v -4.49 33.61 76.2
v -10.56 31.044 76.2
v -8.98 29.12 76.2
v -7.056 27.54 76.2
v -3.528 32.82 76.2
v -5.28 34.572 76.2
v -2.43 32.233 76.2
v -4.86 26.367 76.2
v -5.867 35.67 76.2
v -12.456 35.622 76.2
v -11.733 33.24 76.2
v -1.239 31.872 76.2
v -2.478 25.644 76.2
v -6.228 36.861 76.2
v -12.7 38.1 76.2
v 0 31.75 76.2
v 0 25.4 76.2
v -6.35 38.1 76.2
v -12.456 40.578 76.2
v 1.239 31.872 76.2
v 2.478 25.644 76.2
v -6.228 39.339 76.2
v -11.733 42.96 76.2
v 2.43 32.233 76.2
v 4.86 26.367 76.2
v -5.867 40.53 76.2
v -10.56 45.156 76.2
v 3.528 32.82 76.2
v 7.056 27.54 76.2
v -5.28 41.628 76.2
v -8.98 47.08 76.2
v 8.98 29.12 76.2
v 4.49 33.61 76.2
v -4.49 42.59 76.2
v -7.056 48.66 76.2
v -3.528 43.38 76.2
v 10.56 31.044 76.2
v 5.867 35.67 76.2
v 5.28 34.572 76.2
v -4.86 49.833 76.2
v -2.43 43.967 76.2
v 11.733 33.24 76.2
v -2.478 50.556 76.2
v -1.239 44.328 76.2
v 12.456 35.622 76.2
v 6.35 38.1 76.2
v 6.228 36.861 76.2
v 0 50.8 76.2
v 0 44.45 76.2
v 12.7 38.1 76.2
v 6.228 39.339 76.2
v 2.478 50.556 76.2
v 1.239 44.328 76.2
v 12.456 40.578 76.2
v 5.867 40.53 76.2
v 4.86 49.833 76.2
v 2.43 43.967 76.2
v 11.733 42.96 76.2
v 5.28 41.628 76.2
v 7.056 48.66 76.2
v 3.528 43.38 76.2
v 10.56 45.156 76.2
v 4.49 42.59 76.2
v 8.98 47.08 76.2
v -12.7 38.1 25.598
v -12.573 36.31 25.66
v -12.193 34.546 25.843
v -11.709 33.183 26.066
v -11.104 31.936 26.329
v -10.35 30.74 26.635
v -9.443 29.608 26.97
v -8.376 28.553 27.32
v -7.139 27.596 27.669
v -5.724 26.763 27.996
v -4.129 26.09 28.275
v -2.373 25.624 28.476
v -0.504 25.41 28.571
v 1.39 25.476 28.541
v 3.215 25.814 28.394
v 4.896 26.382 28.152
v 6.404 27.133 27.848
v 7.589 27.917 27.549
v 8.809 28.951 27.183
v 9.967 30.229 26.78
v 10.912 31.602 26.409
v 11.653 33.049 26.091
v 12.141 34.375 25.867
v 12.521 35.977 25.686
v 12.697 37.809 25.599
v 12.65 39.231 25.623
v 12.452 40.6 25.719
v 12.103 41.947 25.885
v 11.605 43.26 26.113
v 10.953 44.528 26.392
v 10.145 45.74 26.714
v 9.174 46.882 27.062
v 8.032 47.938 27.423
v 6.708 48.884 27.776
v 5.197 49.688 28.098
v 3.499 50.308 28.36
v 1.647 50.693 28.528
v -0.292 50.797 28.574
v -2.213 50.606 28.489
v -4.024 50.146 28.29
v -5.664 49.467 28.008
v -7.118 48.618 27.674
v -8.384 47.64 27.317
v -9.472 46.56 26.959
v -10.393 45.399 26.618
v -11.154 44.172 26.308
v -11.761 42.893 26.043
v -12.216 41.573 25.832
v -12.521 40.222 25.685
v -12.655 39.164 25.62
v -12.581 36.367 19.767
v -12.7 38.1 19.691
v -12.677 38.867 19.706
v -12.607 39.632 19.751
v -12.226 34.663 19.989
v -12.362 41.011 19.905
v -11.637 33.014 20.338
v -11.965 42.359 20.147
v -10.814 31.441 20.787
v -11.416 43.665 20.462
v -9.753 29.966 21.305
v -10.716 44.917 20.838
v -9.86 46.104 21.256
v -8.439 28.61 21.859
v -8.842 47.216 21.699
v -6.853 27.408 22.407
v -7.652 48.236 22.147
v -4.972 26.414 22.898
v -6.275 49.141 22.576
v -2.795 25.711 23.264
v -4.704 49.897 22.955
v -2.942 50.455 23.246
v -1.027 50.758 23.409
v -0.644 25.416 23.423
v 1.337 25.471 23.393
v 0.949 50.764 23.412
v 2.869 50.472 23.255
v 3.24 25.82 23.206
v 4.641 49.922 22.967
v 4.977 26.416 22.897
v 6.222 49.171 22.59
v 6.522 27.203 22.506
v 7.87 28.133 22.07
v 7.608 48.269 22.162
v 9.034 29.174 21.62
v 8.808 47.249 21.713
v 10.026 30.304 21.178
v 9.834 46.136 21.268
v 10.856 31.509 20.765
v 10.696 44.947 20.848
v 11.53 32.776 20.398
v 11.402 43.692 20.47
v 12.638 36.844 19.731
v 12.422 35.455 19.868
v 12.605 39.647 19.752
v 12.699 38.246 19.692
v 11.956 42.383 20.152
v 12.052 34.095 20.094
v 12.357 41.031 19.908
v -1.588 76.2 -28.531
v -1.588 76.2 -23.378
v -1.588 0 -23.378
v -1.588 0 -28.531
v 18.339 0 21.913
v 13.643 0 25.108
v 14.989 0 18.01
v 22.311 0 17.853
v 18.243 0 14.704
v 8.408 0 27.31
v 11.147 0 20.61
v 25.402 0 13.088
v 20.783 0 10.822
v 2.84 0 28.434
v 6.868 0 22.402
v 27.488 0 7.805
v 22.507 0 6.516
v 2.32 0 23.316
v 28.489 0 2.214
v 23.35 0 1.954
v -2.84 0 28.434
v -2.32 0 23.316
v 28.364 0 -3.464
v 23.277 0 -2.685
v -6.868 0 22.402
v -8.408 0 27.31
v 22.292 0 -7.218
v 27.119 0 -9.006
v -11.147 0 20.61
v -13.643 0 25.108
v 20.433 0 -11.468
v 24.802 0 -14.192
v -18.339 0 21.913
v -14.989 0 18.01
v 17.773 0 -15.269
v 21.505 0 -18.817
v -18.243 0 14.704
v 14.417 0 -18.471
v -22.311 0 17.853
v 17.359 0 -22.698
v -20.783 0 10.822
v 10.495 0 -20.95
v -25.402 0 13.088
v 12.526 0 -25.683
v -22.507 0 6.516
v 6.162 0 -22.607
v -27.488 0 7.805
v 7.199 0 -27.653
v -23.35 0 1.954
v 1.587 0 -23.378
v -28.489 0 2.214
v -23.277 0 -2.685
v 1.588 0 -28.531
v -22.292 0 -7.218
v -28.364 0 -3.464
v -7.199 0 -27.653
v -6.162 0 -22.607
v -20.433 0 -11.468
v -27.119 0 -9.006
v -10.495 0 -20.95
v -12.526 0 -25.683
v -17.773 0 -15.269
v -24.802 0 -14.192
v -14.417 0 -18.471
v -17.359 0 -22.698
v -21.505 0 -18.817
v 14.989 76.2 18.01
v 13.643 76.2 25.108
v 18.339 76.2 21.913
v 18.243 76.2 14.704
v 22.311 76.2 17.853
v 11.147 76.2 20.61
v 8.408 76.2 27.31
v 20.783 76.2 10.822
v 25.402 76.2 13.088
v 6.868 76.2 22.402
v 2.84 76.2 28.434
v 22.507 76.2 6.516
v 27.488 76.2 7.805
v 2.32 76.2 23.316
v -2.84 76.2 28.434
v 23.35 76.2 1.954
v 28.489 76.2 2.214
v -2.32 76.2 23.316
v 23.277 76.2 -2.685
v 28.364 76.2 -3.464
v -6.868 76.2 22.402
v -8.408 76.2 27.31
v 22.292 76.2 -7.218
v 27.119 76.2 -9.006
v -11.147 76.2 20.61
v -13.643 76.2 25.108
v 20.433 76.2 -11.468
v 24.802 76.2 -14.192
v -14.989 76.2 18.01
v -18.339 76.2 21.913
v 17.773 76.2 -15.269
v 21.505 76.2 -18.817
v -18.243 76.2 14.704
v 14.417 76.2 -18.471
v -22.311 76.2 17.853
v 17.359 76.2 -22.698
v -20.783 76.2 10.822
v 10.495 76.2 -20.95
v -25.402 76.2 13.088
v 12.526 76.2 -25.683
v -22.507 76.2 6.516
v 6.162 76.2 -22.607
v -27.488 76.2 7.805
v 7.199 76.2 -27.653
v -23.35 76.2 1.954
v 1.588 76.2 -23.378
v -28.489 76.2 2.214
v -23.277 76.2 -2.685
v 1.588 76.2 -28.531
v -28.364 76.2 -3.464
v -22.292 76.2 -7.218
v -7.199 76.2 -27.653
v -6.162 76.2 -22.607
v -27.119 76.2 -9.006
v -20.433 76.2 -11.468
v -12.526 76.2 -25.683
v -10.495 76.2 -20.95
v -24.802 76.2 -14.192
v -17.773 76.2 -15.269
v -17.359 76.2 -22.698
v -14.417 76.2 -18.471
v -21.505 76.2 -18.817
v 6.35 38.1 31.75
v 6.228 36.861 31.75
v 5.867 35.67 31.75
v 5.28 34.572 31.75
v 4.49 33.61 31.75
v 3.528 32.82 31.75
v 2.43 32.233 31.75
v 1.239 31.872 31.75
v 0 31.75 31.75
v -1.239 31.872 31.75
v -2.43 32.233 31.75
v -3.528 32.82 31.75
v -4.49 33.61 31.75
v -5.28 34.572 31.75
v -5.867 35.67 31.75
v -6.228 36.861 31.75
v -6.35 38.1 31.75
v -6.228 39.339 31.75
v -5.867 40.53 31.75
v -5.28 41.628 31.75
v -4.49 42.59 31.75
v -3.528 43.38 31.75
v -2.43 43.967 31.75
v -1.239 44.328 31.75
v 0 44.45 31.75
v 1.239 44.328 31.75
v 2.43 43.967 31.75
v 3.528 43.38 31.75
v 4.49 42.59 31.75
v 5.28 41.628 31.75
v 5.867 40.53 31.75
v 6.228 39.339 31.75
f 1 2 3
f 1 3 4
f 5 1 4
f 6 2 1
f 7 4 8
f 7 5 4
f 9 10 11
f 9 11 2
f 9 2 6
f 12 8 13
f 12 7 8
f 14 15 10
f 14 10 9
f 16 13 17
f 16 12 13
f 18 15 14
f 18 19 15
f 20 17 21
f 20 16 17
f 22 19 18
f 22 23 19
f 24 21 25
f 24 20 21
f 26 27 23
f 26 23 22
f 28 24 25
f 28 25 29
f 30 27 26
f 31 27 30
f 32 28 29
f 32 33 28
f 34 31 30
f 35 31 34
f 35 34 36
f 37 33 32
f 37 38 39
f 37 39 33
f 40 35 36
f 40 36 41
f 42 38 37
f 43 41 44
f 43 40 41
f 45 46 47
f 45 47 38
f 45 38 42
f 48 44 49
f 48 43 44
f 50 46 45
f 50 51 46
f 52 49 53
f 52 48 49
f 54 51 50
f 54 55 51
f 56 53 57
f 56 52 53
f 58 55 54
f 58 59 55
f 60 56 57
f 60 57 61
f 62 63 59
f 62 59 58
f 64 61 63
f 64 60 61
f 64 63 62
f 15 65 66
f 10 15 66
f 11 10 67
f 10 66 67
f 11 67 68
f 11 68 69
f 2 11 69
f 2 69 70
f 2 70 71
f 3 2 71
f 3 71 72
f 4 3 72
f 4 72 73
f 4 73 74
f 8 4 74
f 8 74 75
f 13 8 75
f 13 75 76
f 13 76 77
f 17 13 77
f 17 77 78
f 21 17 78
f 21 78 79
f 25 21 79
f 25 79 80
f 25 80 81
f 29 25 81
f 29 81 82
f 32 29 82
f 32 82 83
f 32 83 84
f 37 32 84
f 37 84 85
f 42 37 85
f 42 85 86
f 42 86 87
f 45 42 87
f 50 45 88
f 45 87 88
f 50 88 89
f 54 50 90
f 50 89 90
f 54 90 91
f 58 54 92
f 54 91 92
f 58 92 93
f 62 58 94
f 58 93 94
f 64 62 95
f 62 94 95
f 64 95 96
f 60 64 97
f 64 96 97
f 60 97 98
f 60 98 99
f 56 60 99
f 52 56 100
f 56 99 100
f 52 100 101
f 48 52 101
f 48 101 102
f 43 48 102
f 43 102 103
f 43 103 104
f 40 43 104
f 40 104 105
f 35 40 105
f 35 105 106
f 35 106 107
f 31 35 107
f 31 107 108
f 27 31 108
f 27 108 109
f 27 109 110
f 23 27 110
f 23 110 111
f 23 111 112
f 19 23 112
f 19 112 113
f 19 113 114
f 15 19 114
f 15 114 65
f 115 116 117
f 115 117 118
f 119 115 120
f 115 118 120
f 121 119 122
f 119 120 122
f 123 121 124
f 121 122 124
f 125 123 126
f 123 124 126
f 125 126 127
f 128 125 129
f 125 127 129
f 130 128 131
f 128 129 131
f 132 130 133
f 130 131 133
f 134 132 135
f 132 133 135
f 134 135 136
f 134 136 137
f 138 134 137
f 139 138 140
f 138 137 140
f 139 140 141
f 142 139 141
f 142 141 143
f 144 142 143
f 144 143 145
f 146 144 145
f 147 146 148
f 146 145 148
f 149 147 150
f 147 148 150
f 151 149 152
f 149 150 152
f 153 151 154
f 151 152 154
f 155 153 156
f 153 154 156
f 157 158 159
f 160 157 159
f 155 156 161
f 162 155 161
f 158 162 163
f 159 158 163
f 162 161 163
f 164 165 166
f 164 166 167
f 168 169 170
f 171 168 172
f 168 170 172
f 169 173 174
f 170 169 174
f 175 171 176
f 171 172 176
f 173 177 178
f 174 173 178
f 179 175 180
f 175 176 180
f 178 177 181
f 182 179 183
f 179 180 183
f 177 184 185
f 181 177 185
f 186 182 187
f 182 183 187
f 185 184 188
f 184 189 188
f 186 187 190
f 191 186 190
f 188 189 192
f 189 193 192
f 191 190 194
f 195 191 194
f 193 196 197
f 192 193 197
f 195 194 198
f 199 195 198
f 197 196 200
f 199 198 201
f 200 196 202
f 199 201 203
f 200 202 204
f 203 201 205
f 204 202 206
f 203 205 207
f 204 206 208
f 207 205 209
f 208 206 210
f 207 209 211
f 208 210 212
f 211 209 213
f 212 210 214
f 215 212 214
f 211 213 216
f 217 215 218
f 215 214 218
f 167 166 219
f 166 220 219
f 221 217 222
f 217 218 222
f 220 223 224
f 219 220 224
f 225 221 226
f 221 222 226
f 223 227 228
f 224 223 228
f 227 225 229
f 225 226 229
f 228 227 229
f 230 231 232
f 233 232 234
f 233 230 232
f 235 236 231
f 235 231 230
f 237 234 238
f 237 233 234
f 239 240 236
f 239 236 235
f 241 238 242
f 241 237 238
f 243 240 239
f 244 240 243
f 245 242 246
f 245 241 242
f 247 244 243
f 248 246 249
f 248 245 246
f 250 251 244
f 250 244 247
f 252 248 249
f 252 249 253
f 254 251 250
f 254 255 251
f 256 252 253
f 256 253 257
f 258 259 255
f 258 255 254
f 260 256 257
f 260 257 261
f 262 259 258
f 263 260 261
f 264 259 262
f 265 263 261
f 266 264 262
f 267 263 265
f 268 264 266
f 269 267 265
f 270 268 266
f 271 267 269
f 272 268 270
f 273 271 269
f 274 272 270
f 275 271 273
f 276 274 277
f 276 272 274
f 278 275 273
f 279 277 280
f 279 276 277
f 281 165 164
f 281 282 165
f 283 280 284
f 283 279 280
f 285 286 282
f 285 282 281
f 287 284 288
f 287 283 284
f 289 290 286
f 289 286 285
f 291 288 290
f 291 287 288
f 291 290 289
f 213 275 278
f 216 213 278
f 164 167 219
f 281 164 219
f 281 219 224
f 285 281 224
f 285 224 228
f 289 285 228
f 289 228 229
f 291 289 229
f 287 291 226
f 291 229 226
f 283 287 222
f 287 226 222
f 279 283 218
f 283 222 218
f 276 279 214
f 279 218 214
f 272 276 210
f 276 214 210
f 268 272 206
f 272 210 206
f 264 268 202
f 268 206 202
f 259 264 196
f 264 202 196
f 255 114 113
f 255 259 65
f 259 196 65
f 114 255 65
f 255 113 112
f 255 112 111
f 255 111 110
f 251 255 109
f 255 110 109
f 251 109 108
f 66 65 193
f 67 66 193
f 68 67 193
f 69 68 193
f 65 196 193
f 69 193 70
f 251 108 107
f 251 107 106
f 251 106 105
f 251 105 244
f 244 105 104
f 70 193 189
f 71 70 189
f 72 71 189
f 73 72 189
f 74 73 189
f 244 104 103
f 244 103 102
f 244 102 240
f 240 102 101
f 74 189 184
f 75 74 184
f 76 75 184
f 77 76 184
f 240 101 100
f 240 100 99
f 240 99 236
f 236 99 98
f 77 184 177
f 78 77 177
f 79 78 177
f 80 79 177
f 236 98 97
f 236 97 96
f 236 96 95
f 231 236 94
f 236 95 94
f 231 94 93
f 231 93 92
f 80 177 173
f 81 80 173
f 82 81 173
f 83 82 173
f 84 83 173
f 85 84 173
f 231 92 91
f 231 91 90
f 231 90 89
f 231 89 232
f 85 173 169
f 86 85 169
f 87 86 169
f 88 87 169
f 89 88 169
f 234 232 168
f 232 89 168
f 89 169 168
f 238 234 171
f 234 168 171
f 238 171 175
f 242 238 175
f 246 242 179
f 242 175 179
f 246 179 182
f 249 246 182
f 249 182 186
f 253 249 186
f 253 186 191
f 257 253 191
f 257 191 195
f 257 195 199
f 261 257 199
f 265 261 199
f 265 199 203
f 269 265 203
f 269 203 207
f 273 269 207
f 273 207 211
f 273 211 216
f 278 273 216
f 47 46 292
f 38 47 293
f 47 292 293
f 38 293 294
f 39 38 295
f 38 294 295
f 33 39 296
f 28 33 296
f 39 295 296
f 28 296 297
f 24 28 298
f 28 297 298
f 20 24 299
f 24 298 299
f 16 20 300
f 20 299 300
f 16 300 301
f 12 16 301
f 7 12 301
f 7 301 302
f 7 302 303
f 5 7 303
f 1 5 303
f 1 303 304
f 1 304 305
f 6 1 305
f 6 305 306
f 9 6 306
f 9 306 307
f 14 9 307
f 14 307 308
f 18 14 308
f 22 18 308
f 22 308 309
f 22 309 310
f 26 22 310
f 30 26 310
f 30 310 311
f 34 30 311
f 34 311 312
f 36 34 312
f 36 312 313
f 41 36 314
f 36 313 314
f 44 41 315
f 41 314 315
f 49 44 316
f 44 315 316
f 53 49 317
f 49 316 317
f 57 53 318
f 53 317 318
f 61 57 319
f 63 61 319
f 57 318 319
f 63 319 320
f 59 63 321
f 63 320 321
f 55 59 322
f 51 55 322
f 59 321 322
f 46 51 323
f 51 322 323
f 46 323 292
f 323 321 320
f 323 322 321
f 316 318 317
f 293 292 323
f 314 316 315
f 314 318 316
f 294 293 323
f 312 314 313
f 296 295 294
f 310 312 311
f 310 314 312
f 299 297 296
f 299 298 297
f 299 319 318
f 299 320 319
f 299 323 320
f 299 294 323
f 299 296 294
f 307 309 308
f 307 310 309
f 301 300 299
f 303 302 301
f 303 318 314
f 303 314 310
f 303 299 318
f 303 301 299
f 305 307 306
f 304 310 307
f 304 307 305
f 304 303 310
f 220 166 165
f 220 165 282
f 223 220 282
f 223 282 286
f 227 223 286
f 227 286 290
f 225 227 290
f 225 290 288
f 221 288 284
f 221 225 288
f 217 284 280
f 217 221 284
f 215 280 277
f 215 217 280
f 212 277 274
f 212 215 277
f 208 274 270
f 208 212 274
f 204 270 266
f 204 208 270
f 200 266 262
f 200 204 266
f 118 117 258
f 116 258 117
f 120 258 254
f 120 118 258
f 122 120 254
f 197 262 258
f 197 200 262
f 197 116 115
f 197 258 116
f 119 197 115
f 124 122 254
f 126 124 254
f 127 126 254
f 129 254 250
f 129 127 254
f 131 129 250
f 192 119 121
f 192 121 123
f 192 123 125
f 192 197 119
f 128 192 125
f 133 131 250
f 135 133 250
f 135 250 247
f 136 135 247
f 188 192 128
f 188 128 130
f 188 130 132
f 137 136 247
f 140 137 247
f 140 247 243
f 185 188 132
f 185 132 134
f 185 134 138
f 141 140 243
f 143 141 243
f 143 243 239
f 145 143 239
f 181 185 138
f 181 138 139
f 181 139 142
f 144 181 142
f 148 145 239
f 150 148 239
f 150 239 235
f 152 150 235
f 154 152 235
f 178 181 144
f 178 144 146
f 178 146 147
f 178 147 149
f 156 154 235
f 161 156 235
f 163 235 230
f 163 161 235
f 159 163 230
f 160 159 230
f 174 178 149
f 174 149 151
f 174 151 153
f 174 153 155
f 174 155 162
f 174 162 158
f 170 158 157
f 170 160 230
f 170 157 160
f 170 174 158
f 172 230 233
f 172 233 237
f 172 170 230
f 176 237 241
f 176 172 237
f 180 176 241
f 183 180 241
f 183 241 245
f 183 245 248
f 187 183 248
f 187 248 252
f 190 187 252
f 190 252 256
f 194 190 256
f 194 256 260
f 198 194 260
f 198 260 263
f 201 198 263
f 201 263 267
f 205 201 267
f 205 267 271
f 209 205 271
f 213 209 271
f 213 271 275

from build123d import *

# Parameters (mm, degrees)
SKETCH1_R           = 28.575
SKETCH1_R_2         = 23.4315
BOSS_EXTRUDE1_DEPTH = 76.2
BOSS_EXTRUDE2_DEPTH = 76.2
BOSS_EXTRUDE4_START = -31.75
SKETCH5_R           = 12.7
BOSS_EXTRUDE4_DEPTH = 31.75
SKETCH3_R           = 23.4315
CUT_EXTRUDE1_DEPTH  = 112.487266812
SKETCH6_W           = 3.175
SKETCH6_H           = 34.556340068
CUT_EXTRUDE2_DEPTH  = 112.487266812


with BuildPart() as part:
    # Sketch1 → Boss-Extrude1 (new body)
    with BuildSketch(Plane(origin=(0, 0, 0), x_dir=(1, 0, 0), z_dir=(0, 1, 0))):
        with Locations(Location((0, 0, 0), (0, 0, 90))):
            Circle(SKETCH1_R)
        with Locations(Location((0, 0, 0), (0, 0, 90))):
            Circle(SKETCH1_R_2, mode=Mode.SUBTRACT)
    extrude(amount=BOSS_EXTRUDE1_DEPTH)

    # Sketch2 → Boss-Extrude2 (add)
    with BuildSketch(Plane.XY):
        with BuildLine():
            ThreePointArc((-6.35, 38.1), (0, 44.45), (6.35, 38.1))
            Line((6.35, 38.1), (12.7, 38.1))
            ThreePointArc((12.7, 38.1), (0, 50.8), (-12.7, 38.1))
            Line((-12.7, 38.1), (-6.35, 38.1))
        make_face()
        with BuildLine():
            Line((12.7, 38.1), (6.35, 38.1))
            ThreePointArc((6.35, 38.1), (0, 31.75), (-6.35, 38.1))
            Line((-6.35, 38.1), (-12.7, 38.1))
            ThreePointArc((-12.7, 38.1), (0, 25.4), (12.7, 38.1))
        make_face()
    extrude(amount=BOSS_EXTRUDE2_DEPTH)

    # Sketch5 → Boss-Extrude4 (add)
    with BuildSketch(Plane.XY.offset(31.75).offset(BOSS_EXTRUDE4_START)):
        with Locations(Location((0, 38.1, 0), (0, 0, 180))):
            Circle(SKETCH5_R)
    extrude(amount=BOSS_EXTRUDE4_DEPTH)

    # Sketch3 → Cut-Extrude1 (cut, through all)
    with BuildSketch(Plane(origin=(0, 76.2, 0), x_dir=(1, 0, 0), z_dir=(0, 1, 0))):
        with Locations(Location((0, 0, 0), (0, 0, 90))):
            Circle(SKETCH3_R)
    extrude(amount=-CUT_EXTRUDE1_DEPTH, mode=Mode.SUBTRACT)

    # Sketch6 → Cut-Extrude2 (cut, through all)
    with BuildSketch(Plane(origin=(0, 76.2, 0), x_dir=(1, 0, 0), z_dir=(0, 1, 0))):
        with Locations((0, 23.4315)):
            Rectangle(SKETCH6_W, SKETCH6_H)
    extrude(amount=-CUT_EXTRUDE2_DEPTH, mode=Mode.SUBTRACT)


solid = part.part
